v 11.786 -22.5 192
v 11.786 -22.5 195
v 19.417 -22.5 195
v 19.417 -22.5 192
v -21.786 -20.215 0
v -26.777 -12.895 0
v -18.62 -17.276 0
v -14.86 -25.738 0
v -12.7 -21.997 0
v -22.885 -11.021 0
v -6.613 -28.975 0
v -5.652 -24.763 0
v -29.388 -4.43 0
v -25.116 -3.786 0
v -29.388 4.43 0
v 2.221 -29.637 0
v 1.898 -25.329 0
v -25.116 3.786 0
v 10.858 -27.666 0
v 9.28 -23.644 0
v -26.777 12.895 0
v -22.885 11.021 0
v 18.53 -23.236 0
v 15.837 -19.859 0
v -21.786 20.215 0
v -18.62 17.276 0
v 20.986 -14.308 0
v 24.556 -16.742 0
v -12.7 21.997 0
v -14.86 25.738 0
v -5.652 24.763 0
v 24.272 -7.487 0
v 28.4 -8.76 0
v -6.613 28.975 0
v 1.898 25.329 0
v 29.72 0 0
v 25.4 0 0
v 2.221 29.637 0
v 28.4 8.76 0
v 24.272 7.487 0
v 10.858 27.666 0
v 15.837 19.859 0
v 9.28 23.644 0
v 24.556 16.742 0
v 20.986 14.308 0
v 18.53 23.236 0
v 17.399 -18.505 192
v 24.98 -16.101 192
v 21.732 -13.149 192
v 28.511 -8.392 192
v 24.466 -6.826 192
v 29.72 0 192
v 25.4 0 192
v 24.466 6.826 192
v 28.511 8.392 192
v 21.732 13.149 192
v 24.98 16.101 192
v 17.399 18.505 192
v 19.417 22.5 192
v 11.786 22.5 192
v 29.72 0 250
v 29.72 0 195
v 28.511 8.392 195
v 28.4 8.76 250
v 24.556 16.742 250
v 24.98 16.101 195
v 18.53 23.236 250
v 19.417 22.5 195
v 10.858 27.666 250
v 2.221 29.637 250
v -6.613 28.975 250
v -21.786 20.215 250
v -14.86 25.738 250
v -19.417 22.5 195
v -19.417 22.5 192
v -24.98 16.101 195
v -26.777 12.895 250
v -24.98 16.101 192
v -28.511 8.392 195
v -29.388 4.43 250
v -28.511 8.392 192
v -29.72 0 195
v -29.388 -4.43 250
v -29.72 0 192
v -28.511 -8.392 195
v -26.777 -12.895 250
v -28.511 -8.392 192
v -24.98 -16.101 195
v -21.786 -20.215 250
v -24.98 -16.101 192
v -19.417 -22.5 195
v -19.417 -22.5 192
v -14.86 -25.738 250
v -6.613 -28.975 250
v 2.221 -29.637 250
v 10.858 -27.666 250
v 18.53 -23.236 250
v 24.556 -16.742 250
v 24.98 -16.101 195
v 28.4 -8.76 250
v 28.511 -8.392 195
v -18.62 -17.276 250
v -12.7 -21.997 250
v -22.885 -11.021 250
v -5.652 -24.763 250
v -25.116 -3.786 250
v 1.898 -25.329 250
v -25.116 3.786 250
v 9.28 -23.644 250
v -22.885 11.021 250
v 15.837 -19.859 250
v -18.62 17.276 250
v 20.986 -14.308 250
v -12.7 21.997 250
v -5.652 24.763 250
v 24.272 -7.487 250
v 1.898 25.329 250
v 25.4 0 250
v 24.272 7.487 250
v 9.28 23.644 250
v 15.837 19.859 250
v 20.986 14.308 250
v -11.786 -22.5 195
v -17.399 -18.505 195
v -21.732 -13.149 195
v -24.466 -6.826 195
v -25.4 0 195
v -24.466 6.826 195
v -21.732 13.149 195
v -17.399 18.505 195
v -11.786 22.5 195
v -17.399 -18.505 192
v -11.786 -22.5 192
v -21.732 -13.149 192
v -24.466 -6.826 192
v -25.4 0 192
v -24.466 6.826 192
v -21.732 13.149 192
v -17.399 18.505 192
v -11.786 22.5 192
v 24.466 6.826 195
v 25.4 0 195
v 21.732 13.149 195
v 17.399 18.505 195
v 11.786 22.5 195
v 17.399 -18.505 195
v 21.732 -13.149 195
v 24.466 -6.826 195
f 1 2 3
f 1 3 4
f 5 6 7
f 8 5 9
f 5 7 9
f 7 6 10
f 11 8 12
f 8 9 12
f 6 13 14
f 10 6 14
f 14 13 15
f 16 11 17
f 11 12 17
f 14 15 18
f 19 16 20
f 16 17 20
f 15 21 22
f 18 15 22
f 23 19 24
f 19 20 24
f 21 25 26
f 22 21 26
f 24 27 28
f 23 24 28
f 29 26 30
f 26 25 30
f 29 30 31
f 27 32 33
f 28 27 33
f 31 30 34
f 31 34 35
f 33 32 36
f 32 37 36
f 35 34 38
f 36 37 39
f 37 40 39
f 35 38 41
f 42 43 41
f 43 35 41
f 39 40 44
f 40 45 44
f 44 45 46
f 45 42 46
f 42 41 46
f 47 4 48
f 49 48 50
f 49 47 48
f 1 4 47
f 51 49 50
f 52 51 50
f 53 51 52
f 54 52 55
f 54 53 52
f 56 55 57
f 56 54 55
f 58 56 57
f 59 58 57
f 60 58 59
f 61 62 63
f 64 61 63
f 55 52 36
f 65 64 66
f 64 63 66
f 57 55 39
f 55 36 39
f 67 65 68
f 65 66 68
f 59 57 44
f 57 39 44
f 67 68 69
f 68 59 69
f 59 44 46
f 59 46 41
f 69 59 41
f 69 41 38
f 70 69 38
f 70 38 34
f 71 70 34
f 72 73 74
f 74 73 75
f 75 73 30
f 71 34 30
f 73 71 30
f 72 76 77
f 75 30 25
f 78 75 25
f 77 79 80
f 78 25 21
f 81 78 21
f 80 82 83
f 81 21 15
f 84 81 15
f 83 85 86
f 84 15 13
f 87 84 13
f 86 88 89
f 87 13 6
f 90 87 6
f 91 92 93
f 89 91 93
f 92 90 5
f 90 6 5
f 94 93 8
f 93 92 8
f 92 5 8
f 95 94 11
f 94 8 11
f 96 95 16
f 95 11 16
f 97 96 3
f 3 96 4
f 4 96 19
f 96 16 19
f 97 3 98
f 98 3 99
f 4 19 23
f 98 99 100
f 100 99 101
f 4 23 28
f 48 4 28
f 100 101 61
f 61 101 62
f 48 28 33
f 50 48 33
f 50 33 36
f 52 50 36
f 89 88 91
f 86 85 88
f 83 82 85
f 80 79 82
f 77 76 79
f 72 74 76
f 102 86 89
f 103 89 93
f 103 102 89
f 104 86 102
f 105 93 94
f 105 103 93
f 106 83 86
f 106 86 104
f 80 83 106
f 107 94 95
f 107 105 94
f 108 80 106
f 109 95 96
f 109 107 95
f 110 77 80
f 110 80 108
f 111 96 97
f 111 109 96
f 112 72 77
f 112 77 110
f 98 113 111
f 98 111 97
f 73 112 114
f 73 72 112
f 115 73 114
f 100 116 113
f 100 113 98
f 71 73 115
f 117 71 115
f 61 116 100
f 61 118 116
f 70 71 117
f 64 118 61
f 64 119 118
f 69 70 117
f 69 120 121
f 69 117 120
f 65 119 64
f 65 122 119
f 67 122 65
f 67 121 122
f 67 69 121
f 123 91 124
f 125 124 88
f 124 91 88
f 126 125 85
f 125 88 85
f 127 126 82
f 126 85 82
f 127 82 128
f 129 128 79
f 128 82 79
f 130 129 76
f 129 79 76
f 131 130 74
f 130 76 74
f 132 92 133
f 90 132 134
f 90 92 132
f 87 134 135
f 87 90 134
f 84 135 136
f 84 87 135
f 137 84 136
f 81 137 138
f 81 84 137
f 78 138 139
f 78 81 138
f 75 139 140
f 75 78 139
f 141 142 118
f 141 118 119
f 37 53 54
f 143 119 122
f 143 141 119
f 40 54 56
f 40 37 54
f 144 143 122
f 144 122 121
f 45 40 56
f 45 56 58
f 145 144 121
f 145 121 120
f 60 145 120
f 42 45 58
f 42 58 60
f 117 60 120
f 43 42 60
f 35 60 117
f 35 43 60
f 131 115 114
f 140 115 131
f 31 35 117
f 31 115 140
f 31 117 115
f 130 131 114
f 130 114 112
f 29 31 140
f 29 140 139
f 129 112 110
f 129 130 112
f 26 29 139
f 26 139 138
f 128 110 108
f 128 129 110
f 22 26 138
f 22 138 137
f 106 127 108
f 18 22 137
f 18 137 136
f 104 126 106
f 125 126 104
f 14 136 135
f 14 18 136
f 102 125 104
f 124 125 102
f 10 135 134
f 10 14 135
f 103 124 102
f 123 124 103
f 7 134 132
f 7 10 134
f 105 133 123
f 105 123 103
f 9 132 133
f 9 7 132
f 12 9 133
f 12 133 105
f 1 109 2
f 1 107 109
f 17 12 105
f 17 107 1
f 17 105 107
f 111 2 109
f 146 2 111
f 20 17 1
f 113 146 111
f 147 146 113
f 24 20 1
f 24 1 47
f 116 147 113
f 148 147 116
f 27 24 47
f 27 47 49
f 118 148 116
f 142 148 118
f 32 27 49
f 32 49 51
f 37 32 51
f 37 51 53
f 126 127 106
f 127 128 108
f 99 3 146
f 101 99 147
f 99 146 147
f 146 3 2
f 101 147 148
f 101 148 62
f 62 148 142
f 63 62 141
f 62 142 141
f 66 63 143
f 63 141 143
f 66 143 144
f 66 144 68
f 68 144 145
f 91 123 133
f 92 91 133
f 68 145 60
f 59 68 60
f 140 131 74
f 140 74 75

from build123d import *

# Parameters (mm, degrees)
CROQUIS1_R                 = 29.72
CROQUIS1_R_2               = 25.4
SALIENTE_EXTRUIR1_DEPTH    = 250
CORTAR_EXTRUIR1_DEPTH      = 254.508494532
CORTAR_EXTRUIR1_DEPTH_BACK = 254.508494532
CROQUIS2_W                 = 3
CROQUIS2_H                 = 45


with BuildPart() as part:
    # Croquis1 → Saliente-Extruir1 (new body)
    with BuildSketch(Plane.XY):
        Circle(CROQUIS1_R)
        Circle(CROQUIS1_R_2, mode=Mode.SUBTRACT)
    extrude(amount=SALIENTE_EXTRUIR1_DEPTH)

    # Croquis2 → Cortar-Extruir1 (cut, two sides: drawn at the far end of the back side and taken through both)
    with BuildSketch(Plane(origin=(0, 0, 0), x_dir=(0, 0, -1), z_dir=(1, 0, 0)).offset(-CORTAR_EXTRUIR1_DEPTH_BACK)):
        with Locations((-193.5, 0)):
            Rectangle(CROQUIS2_W, CROQUIS2_H)
    extrude(amount=CORTAR_EXTRUIR1_DEPTH + CORTAR_EXTRUIR1_DEPTH_BACK, mode=Mode.SUBTRACT)


solid = part.part
